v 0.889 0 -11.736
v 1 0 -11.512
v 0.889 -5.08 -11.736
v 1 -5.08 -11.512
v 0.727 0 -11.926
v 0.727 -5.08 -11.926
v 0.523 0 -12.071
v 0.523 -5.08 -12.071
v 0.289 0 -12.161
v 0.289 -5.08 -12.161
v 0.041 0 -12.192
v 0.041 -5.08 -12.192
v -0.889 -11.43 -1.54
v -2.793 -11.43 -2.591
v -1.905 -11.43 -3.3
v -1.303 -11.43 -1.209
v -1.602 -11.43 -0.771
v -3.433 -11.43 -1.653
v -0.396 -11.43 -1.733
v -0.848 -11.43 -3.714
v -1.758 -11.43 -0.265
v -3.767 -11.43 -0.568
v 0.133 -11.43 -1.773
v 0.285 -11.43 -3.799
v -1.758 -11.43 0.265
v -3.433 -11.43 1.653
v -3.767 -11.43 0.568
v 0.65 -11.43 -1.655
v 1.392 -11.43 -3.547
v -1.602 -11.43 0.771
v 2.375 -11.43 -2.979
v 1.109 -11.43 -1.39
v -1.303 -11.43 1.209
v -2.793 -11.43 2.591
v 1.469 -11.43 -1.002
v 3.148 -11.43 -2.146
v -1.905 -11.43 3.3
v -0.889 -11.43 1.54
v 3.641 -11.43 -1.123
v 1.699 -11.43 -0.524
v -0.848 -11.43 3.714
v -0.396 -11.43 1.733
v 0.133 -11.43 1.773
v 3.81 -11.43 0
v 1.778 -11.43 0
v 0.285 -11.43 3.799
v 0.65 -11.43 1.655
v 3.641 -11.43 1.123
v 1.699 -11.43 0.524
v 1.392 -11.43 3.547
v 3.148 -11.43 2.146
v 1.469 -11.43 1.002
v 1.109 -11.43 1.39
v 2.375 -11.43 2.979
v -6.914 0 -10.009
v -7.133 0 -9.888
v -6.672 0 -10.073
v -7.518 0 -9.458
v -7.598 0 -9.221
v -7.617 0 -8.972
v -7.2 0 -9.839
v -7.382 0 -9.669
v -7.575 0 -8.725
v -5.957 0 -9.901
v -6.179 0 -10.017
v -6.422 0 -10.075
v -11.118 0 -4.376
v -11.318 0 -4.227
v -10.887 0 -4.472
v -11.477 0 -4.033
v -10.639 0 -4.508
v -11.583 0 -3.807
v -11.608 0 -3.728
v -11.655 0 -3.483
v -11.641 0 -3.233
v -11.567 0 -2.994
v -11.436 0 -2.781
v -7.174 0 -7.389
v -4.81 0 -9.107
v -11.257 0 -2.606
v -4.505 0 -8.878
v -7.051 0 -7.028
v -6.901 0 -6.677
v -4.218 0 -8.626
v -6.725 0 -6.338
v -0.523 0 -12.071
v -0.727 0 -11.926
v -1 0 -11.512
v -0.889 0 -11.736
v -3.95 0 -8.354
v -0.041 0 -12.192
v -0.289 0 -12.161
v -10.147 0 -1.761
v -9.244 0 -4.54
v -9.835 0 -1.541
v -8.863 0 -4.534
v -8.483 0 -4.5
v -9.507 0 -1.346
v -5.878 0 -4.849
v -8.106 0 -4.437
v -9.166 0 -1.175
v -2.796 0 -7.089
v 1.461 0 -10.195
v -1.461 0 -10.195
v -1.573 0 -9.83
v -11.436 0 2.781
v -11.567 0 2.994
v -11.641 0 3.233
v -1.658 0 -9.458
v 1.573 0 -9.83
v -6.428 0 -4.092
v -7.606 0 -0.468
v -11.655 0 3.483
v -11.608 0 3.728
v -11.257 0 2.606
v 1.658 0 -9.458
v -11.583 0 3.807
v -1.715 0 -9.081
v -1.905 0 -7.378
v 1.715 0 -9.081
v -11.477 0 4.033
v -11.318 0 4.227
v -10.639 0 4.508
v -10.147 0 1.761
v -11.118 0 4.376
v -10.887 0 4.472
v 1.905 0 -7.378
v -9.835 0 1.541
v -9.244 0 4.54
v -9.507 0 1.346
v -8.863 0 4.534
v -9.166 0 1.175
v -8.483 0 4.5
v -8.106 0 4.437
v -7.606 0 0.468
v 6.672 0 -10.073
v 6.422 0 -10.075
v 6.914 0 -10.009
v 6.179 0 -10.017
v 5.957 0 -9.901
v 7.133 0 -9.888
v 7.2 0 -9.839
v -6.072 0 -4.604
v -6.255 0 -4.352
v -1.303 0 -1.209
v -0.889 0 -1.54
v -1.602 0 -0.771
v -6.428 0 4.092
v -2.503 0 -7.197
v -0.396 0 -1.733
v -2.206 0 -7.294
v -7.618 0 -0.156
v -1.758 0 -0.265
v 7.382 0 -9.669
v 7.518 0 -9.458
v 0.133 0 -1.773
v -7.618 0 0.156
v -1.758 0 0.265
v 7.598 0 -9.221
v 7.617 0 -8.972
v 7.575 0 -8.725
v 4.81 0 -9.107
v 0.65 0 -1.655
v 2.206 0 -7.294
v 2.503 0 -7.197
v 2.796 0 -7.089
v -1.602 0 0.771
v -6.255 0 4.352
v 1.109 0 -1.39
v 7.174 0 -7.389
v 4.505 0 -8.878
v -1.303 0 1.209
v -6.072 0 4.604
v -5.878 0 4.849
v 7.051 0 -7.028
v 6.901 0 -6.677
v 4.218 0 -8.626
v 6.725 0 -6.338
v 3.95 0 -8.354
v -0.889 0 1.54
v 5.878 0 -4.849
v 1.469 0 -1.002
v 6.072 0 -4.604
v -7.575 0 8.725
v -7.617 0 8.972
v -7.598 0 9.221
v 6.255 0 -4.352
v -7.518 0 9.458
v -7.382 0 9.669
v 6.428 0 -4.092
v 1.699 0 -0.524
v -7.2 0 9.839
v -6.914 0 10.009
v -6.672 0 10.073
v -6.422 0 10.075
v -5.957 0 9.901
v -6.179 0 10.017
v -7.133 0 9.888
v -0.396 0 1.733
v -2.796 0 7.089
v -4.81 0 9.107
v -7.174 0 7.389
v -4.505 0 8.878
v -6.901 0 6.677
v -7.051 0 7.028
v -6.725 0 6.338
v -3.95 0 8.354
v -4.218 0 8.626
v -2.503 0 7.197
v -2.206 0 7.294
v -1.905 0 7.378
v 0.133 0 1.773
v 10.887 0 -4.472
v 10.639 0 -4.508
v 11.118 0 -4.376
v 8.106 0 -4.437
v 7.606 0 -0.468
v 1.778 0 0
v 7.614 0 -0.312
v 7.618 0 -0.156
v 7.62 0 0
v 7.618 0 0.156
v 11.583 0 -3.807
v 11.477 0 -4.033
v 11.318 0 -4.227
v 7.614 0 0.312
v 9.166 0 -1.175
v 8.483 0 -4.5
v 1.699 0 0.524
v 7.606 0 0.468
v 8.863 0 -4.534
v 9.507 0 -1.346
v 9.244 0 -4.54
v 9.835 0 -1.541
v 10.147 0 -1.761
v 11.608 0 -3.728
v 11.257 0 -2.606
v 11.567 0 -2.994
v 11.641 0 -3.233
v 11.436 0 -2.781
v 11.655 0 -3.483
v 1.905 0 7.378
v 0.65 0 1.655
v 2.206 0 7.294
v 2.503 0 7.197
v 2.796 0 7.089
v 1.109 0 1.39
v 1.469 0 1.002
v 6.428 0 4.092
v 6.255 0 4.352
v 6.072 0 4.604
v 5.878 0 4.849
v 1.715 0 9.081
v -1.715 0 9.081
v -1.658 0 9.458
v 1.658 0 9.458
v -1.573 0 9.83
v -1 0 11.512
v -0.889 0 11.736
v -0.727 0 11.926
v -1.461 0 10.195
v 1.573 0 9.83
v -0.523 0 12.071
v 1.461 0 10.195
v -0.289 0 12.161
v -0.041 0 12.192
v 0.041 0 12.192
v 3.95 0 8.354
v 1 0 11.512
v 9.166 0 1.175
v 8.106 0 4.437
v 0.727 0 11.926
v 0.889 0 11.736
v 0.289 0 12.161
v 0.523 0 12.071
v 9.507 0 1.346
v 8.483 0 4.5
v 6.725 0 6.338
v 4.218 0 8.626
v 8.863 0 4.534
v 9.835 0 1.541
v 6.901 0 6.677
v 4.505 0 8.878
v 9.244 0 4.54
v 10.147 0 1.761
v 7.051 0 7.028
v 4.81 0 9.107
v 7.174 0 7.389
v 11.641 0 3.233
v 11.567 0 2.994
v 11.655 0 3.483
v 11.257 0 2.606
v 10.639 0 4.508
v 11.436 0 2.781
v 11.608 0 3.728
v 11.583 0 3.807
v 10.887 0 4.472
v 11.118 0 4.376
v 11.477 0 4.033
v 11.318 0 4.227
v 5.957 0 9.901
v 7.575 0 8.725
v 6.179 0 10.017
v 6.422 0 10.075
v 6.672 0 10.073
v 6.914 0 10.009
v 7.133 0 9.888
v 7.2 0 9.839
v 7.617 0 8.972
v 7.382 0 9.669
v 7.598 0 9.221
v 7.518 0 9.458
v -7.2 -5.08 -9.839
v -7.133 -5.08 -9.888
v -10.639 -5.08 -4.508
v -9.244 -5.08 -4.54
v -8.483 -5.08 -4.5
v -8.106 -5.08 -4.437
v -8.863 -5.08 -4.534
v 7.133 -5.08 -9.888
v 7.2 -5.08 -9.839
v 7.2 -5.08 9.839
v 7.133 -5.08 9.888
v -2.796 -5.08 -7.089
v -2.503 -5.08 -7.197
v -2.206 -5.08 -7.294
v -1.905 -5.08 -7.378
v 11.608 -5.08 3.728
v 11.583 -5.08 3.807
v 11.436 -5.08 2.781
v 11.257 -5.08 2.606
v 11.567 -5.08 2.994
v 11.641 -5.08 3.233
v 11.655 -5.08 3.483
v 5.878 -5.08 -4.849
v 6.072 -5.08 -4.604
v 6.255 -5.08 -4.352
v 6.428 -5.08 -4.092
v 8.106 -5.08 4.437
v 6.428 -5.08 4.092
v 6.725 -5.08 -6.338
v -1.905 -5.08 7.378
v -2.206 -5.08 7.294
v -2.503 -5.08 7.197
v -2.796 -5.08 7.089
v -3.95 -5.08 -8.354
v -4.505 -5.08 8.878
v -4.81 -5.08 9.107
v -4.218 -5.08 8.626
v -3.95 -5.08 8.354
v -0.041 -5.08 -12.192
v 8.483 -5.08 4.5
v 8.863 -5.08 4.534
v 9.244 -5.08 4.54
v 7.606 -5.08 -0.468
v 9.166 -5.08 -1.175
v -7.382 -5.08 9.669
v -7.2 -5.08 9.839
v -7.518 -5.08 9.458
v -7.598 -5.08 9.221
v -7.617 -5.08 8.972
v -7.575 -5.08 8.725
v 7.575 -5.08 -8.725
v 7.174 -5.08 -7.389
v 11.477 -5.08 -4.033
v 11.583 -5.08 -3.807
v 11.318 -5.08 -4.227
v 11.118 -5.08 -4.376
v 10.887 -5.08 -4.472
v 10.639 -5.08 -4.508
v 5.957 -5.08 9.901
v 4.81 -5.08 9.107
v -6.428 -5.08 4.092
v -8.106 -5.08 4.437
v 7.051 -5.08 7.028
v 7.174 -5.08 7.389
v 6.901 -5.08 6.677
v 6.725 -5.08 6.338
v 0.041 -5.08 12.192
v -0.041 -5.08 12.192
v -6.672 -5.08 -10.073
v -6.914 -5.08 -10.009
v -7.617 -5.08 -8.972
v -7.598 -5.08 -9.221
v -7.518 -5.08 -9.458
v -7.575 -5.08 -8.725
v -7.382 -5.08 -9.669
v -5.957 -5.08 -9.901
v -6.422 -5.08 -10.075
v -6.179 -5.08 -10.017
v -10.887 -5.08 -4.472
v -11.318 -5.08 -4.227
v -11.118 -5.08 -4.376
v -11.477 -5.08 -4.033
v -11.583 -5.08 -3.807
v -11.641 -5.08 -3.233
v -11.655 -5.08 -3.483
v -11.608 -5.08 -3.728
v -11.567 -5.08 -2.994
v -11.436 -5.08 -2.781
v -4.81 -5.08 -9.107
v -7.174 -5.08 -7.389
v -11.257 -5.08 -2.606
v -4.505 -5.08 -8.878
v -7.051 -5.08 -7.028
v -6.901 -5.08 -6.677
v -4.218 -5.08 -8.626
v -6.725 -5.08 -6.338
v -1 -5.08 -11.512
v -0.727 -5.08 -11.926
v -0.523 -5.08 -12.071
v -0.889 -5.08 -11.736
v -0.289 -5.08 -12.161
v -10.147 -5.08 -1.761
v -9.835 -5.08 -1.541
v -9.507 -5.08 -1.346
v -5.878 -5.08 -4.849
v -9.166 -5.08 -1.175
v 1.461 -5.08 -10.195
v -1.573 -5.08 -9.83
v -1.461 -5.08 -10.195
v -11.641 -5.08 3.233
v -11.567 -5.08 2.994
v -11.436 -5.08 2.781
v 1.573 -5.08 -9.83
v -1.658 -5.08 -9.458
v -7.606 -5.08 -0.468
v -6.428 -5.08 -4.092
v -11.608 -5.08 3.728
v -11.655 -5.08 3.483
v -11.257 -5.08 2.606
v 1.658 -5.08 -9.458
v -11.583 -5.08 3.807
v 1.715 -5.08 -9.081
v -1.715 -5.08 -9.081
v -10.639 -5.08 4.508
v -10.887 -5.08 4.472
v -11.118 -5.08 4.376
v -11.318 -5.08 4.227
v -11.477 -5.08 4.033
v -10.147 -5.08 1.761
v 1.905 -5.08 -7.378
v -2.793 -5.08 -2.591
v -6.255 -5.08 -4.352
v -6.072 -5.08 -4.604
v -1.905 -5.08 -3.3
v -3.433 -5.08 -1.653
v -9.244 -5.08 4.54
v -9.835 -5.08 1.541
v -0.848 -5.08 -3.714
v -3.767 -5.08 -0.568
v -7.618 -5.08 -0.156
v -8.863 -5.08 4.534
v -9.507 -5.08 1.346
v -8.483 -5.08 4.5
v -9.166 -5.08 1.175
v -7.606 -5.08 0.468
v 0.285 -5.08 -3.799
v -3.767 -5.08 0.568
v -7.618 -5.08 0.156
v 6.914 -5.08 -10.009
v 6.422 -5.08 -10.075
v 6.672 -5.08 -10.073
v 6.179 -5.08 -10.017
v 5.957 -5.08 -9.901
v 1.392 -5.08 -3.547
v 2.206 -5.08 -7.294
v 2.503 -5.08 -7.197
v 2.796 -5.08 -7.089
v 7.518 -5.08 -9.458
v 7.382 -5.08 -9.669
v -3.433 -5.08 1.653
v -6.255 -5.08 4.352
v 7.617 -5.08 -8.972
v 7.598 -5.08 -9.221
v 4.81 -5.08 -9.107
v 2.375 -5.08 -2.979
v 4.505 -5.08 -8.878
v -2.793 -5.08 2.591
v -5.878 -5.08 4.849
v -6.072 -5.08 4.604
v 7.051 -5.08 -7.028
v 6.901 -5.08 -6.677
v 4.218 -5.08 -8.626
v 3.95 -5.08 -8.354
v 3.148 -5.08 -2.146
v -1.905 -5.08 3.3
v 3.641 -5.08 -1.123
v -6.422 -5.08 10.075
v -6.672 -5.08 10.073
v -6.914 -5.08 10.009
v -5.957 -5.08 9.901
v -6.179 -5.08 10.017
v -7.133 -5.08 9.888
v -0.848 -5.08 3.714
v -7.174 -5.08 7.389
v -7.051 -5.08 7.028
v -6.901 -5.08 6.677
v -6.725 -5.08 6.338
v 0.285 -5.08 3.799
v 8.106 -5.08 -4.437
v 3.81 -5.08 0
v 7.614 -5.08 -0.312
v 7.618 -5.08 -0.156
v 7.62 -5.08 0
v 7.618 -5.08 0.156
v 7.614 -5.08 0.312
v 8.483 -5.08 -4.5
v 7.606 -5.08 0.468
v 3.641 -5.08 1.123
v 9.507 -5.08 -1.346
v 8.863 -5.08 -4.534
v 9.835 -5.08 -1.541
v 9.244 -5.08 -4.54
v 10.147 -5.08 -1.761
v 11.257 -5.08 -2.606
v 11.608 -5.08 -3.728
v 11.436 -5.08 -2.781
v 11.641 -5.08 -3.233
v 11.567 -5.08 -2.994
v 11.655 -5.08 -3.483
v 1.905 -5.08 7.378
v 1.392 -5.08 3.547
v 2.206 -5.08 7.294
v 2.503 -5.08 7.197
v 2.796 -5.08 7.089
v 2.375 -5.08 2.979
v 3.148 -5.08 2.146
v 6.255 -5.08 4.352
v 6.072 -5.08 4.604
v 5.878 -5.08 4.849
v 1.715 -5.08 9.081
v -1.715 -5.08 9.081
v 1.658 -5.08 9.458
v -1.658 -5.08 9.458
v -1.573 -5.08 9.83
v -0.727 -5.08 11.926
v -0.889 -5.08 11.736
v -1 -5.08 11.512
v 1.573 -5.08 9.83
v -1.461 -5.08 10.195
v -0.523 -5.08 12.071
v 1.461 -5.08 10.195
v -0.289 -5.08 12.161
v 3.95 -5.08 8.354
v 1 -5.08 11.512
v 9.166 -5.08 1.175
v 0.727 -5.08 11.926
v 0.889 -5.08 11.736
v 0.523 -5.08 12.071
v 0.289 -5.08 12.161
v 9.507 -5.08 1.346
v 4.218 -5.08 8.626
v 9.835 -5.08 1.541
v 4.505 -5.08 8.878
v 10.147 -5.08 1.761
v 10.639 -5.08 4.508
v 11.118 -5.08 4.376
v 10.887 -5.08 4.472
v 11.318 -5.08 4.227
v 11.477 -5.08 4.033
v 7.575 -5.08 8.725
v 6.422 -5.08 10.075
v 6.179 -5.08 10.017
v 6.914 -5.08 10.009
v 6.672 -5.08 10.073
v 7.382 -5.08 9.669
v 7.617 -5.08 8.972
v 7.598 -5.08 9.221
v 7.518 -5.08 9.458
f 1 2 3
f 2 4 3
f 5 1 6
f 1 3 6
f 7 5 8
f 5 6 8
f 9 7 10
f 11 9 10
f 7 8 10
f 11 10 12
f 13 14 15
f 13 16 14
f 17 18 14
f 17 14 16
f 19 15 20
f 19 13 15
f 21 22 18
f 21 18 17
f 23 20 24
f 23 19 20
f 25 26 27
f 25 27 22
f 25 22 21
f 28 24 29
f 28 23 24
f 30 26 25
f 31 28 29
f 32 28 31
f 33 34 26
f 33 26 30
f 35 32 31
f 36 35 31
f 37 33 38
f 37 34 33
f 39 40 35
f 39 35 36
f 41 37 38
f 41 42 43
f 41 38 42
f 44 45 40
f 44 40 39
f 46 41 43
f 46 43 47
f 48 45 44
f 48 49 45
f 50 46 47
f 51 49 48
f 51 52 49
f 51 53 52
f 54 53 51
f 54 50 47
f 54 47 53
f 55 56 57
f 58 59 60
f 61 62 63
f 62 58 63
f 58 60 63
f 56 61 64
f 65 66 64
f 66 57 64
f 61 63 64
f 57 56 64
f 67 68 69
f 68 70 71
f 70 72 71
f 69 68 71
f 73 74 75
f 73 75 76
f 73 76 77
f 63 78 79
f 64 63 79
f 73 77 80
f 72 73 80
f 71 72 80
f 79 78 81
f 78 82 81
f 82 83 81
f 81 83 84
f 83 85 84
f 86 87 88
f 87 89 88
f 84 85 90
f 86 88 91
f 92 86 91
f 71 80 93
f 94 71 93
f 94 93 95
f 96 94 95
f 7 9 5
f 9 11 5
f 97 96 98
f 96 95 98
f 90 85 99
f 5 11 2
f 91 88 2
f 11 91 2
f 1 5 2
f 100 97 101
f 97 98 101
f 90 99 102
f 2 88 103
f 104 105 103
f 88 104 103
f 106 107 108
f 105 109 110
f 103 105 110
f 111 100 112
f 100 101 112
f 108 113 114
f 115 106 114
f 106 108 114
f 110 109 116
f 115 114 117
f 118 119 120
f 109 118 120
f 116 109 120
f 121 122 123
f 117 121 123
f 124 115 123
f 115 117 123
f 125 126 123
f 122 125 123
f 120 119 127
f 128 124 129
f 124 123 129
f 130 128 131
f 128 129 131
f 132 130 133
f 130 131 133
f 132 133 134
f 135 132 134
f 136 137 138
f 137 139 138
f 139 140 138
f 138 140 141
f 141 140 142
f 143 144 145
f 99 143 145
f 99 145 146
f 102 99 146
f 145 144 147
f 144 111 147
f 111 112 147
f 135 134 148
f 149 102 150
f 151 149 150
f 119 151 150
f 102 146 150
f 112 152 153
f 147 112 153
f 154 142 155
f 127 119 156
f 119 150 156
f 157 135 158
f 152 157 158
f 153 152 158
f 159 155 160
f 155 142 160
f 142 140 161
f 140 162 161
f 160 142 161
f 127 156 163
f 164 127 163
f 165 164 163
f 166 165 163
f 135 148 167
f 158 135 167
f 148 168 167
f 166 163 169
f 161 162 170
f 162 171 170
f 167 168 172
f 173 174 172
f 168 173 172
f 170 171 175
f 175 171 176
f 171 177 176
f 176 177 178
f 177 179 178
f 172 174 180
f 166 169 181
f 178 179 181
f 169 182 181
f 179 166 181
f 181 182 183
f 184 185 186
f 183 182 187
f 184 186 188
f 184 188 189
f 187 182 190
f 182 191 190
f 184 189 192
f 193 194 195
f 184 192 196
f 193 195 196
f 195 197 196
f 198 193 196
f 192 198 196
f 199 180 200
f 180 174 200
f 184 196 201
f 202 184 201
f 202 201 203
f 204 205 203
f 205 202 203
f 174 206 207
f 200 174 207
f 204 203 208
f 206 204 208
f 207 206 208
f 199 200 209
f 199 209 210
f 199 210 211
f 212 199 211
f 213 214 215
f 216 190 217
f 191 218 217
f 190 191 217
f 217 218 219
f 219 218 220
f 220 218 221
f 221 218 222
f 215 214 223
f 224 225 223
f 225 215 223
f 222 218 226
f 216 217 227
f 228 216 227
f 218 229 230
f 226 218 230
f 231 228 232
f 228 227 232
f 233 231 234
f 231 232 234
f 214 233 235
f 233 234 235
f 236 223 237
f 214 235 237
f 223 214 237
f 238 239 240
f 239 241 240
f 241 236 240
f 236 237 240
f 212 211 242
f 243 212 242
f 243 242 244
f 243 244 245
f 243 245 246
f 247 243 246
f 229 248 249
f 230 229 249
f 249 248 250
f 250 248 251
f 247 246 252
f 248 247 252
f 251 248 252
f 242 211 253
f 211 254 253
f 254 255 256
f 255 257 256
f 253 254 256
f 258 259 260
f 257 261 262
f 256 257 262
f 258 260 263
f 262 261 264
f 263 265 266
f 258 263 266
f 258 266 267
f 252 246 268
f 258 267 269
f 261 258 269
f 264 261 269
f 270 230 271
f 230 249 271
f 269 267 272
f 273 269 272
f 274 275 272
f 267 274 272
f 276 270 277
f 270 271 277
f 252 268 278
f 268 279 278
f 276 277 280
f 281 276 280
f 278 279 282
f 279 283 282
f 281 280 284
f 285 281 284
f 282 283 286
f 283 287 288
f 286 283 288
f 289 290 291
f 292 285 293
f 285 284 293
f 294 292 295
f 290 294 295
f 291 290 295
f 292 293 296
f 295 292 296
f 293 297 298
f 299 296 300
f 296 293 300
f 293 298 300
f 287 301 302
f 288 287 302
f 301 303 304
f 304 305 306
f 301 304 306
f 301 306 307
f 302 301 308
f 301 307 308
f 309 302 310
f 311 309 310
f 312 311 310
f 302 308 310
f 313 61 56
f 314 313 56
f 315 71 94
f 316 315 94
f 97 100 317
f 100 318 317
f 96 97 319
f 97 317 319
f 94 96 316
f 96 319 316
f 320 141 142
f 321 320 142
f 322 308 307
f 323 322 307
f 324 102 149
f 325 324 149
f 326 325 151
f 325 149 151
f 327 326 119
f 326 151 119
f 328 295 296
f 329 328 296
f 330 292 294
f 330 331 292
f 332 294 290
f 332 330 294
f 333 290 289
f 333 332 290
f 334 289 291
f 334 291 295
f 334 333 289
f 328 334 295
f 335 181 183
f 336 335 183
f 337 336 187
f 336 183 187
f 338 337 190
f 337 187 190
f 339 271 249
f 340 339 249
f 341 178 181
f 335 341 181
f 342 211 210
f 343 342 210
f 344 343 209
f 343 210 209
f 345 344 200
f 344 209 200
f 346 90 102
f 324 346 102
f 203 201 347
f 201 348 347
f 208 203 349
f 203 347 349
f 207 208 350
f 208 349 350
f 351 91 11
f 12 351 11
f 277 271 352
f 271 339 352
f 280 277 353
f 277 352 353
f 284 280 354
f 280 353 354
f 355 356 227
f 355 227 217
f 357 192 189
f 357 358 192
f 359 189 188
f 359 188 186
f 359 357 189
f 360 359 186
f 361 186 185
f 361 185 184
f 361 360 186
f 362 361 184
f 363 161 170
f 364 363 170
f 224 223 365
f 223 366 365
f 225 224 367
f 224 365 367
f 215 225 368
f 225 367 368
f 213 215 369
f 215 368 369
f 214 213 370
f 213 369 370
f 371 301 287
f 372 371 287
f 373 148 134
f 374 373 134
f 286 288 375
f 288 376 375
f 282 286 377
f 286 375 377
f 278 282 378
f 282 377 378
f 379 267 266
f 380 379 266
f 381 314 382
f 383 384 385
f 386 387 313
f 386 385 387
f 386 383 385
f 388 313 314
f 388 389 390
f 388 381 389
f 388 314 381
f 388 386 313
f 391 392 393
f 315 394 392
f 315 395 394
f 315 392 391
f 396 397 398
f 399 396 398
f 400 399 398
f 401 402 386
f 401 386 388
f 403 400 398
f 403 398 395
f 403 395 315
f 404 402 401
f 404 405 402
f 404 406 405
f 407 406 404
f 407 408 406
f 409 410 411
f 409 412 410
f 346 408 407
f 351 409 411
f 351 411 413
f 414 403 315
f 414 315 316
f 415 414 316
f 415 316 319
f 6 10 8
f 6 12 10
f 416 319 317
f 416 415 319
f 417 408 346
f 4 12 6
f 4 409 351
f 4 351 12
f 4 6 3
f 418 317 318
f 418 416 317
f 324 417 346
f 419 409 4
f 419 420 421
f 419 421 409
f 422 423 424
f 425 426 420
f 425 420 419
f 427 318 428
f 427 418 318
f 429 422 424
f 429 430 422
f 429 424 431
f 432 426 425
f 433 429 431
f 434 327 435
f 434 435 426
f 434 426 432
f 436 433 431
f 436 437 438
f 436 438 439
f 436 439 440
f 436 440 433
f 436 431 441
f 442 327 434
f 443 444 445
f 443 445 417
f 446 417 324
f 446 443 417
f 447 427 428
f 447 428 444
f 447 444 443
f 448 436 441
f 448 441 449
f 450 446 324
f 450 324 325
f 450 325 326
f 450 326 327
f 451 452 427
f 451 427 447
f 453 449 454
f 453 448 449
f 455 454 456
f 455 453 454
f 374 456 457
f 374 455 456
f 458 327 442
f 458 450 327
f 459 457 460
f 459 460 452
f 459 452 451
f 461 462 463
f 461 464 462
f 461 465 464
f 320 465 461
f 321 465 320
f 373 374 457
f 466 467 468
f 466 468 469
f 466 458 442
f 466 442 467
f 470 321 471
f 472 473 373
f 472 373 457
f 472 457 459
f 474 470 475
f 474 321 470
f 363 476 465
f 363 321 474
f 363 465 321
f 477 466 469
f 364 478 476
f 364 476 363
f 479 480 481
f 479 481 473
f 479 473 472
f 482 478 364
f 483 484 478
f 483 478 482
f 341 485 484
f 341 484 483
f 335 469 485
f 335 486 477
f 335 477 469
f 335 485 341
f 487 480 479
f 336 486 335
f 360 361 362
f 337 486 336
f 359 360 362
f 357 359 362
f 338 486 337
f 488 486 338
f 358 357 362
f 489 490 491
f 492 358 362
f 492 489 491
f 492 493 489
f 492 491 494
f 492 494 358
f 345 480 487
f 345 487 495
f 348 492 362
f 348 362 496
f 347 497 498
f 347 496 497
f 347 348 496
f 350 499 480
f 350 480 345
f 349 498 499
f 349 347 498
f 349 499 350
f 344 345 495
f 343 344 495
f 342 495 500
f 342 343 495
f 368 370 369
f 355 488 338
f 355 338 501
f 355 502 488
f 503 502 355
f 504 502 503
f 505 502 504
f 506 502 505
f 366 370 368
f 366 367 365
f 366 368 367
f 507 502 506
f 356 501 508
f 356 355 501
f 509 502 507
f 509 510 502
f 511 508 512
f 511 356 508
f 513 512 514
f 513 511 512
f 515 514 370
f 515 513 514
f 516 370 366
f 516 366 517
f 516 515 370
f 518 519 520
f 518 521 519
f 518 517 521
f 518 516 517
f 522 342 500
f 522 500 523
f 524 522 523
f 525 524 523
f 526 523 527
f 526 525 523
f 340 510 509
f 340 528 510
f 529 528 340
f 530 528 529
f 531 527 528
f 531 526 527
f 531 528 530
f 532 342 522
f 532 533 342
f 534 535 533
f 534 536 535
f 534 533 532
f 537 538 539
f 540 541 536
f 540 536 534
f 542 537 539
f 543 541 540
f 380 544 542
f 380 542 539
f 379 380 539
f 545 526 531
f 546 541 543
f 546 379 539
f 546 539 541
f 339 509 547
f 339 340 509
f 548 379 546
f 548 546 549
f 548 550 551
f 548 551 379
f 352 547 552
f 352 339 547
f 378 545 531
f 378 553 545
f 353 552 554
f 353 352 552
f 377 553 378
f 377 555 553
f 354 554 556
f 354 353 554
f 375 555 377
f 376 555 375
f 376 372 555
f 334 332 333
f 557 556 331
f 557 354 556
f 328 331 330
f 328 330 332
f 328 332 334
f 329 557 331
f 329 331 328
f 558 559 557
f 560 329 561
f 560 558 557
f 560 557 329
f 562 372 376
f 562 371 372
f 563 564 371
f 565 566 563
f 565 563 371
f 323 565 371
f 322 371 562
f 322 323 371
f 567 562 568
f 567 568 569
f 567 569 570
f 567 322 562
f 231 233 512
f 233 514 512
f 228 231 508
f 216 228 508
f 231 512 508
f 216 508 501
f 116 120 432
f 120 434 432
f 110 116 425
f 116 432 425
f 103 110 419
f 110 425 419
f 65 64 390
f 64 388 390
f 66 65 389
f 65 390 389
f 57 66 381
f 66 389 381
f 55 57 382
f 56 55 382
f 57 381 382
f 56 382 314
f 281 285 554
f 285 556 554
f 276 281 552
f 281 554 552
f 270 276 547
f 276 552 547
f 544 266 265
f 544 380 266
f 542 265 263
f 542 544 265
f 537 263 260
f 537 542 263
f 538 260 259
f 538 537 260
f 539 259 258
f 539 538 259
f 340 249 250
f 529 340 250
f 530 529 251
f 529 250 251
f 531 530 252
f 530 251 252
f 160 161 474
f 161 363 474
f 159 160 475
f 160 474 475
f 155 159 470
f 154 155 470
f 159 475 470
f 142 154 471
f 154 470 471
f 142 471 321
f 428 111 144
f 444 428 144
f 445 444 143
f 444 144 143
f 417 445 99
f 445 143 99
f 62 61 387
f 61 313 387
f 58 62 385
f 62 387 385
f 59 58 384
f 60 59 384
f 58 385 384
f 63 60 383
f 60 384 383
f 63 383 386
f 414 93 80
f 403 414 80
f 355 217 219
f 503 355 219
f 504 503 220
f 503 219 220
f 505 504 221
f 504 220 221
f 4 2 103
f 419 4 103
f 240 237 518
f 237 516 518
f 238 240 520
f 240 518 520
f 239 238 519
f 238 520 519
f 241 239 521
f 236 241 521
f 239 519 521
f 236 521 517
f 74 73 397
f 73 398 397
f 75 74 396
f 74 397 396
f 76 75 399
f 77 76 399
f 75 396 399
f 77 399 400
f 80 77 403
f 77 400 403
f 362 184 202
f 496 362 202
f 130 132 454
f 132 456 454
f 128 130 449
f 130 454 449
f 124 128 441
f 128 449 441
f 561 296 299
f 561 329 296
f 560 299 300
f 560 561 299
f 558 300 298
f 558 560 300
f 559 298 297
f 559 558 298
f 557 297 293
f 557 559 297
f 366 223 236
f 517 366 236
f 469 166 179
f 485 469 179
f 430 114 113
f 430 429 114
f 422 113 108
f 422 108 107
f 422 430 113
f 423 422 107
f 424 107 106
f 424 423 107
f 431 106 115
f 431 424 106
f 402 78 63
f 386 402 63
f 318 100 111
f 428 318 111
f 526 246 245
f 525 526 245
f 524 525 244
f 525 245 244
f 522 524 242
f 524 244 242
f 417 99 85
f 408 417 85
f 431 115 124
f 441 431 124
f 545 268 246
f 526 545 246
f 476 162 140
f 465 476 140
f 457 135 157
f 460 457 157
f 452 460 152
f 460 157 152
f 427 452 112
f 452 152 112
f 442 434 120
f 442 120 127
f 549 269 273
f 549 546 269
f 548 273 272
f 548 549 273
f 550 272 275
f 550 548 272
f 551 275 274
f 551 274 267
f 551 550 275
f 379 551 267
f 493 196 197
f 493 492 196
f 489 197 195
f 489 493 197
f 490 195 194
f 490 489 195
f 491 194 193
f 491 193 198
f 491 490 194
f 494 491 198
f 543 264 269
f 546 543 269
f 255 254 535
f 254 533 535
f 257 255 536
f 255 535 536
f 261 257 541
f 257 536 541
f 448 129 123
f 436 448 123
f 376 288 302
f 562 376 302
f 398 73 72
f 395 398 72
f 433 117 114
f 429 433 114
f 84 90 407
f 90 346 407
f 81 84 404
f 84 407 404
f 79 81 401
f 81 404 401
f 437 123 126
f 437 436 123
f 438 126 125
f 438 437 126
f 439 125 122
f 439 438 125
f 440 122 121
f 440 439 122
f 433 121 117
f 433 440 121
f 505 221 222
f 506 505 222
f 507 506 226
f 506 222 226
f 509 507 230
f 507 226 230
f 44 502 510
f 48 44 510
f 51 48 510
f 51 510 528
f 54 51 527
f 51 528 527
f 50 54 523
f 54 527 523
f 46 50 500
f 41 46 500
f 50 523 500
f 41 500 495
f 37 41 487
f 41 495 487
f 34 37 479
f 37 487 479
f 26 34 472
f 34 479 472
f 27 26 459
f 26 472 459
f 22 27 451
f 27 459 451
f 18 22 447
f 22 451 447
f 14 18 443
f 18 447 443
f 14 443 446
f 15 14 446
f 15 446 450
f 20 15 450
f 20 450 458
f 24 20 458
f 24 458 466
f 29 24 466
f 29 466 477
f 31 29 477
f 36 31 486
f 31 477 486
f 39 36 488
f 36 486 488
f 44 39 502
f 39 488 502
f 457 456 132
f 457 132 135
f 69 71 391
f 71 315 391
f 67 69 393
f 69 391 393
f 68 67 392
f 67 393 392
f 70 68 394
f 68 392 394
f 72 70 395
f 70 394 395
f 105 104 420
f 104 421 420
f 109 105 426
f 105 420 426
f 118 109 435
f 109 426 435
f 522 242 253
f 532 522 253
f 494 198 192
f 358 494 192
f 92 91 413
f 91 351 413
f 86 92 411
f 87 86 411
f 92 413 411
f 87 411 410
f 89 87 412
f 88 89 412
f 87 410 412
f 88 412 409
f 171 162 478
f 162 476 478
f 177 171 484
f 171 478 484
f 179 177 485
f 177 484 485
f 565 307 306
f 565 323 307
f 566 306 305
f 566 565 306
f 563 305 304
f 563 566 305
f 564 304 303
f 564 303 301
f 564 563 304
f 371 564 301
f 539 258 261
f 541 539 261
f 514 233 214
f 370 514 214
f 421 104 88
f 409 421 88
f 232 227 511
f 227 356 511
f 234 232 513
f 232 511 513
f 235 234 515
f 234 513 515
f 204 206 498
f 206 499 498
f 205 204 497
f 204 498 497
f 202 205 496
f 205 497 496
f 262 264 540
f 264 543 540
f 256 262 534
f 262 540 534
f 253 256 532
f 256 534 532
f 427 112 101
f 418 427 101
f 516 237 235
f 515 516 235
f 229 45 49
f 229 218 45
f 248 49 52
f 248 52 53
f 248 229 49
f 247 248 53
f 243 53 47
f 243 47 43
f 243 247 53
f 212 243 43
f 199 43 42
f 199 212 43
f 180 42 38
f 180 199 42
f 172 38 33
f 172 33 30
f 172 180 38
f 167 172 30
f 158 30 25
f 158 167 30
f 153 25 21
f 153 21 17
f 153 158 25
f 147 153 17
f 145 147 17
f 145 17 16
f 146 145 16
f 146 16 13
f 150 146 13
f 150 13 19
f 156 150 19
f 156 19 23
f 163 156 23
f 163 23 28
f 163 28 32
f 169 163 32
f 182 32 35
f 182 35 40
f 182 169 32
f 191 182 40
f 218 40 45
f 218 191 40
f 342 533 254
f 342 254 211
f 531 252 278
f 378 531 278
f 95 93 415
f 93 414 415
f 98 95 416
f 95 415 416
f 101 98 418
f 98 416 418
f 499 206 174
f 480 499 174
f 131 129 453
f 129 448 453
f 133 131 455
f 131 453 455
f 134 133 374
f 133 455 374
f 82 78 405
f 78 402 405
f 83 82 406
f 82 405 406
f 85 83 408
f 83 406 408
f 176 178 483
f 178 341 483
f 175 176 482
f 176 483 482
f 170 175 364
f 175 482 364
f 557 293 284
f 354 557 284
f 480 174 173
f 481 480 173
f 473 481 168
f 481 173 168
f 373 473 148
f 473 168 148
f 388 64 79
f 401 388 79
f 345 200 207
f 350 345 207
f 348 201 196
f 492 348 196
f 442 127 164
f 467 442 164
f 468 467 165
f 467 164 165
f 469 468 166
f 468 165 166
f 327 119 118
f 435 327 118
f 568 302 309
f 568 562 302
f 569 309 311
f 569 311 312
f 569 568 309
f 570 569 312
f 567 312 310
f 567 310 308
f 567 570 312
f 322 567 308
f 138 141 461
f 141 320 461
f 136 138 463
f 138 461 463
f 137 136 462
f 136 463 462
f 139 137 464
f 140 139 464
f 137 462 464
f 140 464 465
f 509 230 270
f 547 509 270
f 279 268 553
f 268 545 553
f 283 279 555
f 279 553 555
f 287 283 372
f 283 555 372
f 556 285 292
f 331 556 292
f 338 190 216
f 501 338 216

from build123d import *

# Parameters (mm, degrees)
F0_R     = 1.778
F1_DEPTH = 5.08
F2_R     = 3.81
F2_R_2   = 1.778
F3_DEPTH = 6.35
F4_R     = 5.08
F5_R     = 1.016


with BuildPart() as f1:
    # F0 (on Front) → F1 (new body)
    with BuildSketch(Plane.XZ):
        with BuildLine():
            ThreePointArc((7.605604, -0.468175), (7.6164, -0.234198), (7.62, 0))
            ThreePointArc((7.62, 0), (7.6164, 0.234198), (7.605604, 0.468175))
            ThreePointArc((7.605604, 0.468175), (7.247051, 2.354709), (6.428249, 4.0917))
            ThreePointArc((6.428249, 4.0917), (6.164709, 4.478924), (5.877877, 4.849223))
            ThreePointArc((5.877877, 4.849223), (4.478924, 6.164709), (2.795522, 7.088685))
            ThreePointArc((2.795522, 7.088685), (2.354709, 7.247051), (1.905, 7.378033))
            ThreePointArc((1.905, 7.378033), (0, 7.62), (-1.905, 7.378033))
            ThreePointArc((-1.905, 7.378033), (-2.354709, 7.247051), (-2.795522, 7.088685))
            ThreePointArc((-2.795522, 7.088685), (-4.478924, 6.164709), (-5.877877, 4.849223))
            ThreePointArc((-5.877877, 4.849223), (-6.164709, 4.478924), (-6.428249, 4.0917))
            ThreePointArc((-6.428249, 4.0917), (-7.247051, 2.354709), (-7.605604, 0.468175))
            ThreePointArc((-7.605604, 0.468175), (-7.62, 0), (-7.605604, -0.468175))
            ThreePointArc((-7.605604, -0.468175), (-7.247051, -2.354709), (-6.428249, -4.0917))
            ThreePointArc((-6.428249, -4.0917), (-6.164709, -4.478924), (-5.877877, -4.849223))
            ThreePointArc((-5.877877, -4.849223), (-4.478924, -6.164709), (-2.795522, -7.088685))
            ThreePointArc((-2.795522, -7.088685), (-2.354709, -7.247051), (-1.905, -7.378033))
            ThreePointArc((-1.905, -7.378033), (0, -7.62), (1.905, -7.378033))
            ThreePointArc((1.905, -7.378033), (2.354709, -7.247051), (2.795522, -7.088685))
            ThreePointArc((2.795522, -7.088685), (4.478924, -6.164709), (5.877877, -4.849223))
            ThreePointArc((5.877877, -4.849223), (6.164709, -4.478924), (6.428249, -4.0917))
            ThreePointArc((6.428249, -4.0917), (7.247051, -2.354709), (7.605604, -0.468175))
        make_face()
        Circle(F0_R, mode=Mode.SUBTRACT)
        with BuildLine():
            ThreePointArc((6.428249, 4.0917), (7.247051, 2.354709), (7.605604, 0.468175))
            Line((7.605604, 0.468175), (9.689785, 1.412438))
            Line((9.689785, 1.412438), (11.830752, 3.04283))
            Line((11.830752, 3.04283), (11.35981, 4.49224))
            Line((11.35981, 4.49224), (8.66941, 4.552826))
            Line((8.66941, 4.552826), (6.428249, 4.0917))
        make_face()
        with BuildLine():
            Line((9.689785, -1.412438), (7.605604, -0.468175))
            ThreePointArc((7.605604, -0.468175), (7.247051, -2.354709), (6.428249, -4.0917))
            Line((6.428249, -4.0917), (8.66941, -4.552826))
            Line((8.66941, -4.552826), (11.35981, -4.49224))
            Line((11.35981, -4.49224), (11.830752, -3.04283))
            Line((11.830752, -3.04283), (9.689785, -1.412438))
        make_face()
        with BuildLine():
            ThreePointArc((2.795522, 7.088685), (4.478924, 6.164709), (5.877877, 4.849223))
            Line((5.877877, 4.849223), (7.00899, 6.838199))
            Line((7.00899, 6.838199), (7.782749, 9.415643))
            Line((7.782749, 9.415643), (6.549807, 10.311428))
            Line((6.549807, 10.311428), (4.337616, 8.779065))
            Line((4.337616, 8.779065), (2.795522, 7.088685))
        make_face()
        with BuildLine():
            Line((7.00899, -6.838199), (5.877877, -4.849223))
            ThreePointArc((5.877877, -4.849223), (4.478924, -6.164709), (2.795522, -7.088685))
            Line((2.795522, -7.088685), (4.337616, -8.779065))
            Line((4.337616, -8.779065), (6.549807, -10.311428))
            Line((6.549807, -10.311428), (7.782749, -9.415643))
            Line((7.782749, -9.415643), (7.00899, -6.838199))
        make_face()
        with BuildLine():
            ThreePointArc((-1.905, 7.378033), (0, 7.62), (1.905, 7.378033))
            Line((1.905, 7.378033), (1.651, 9.652))
            Line((1.651, 9.652), (0.762, 12.192))
            Line((0.762, 12.192), (-0.762, 12.192))
            Line((-0.762, 12.192), (-1.651, 9.652))
            Line((-1.651, 9.652), (-1.905, 7.378033))
        make_face()
        with BuildLine():
            Line((1.651, -9.652), (1.905, -7.378033))
            ThreePointArc((1.905, -7.378033), (0, -7.62), (-1.905, -7.378033))
            Line((-1.905, -7.378033), (-1.651, -9.652))
            Line((-1.651, -9.652), (-0.762, -12.192))
            Line((-0.762, -12.192), (0.762, -12.192))
            Line((0.762, -12.192), (1.651, -9.652))
        make_face()
        with BuildLine():
            ThreePointArc((-5.877877, 4.849223), (-4.478924, 6.164709), (-2.795522, 7.088685))
            Line((-2.795522, 7.088685), (-4.337616, 8.779065))
            Line((-4.337616, 8.779065), (-6.549807, 10.311428))
            Line((-6.549807, 10.311428), (-7.782749, 9.415643))
            Line((-7.782749, 9.415643), (-7.00899, 6.838199))
            Line((-7.00899, 6.838199), (-5.877877, 4.849223))
        make_face()
        with BuildLine():
            Line((-4.337616, -8.779065), (-2.795522, -7.088685))
            ThreePointArc((-2.795522, -7.088685), (-4.478924, -6.164709), (-5.877877, -4.849223))
            Line((-5.877877, -4.849223), (-7.00899, -6.838199))
            Line((-7.00899, -6.838199), (-7.782749, -9.415643))
            Line((-7.782749, -9.415643), (-6.549807, -10.311428))
            Line((-6.549807, -10.311428), (-4.337616, -8.779065))
        make_face()
        with BuildLine():
            ThreePointArc((-7.605604, 0.468175), (-7.247051, 2.354709), (-6.428249, 4.0917))
            Line((-6.428249, 4.0917), (-8.66941, 4.552826))
            Line((-8.66941, 4.552826), (-11.35981, 4.49224))
            Line((-11.35981, 4.49224), (-11.830752, 3.04283))
            Line((-11.830752, 3.04283), (-9.689785, 1.412438))
            Line((-9.689785, 1.412438), (-7.605604, 0.468175))
        make_face()
        with BuildLine():
            Line((-8.66941, -4.552826), (-6.428249, -4.0917))
            ThreePointArc((-6.428249, -4.0917), (-7.247051, -2.354709), (-7.605604, -0.468175))
            Line((-7.605604, -0.468175), (-9.689785, -1.412438))
            Line((-9.689785, -1.412438), (-11.830752, -3.04283))
            Line((-11.830752, -3.04283), (-11.35981, -4.49224))
            Line((-11.35981, -4.49224), (-8.66941, -4.552826))
        make_face()
    extrude(amount=F1_DEPTH)

    # F2 (on face) → F3 (join)
    with BuildSketch(Plane.XZ.offset(5.08)):
        Circle(F2_R)
        Circle(F2_R_2, mode=Mode.SUBTRACT)
    extrude(amount=F3_DEPTH)

    # F4
    f4_edges = [f1.edges().sort_by_distance(p)[0] for p in [
        (7.00899, -2.54, 6.838199),
        (4.337616, -2.54, 8.779065),
        (1.651, -2.54, 9.652),
        (-4.337616, -2.54, 8.779065),
        (-8.66941, -2.54, 4.552826),
        (-9.689785, -2.54, -1.412438),
        (-7.00899, -2.54, -6.838199),
        (-1.651, -2.54, -9.652),
        (4.337616, -2.54, -8.779065),
        (8.66941, -2.54, -4.552826),
        (9.689785, -2.54, 1.412438),
        (9.689785, -2.54, -1.412438),
        (8.66941, -2.54, 4.552826),
        (-1.651, -2.54, 9.652),
        (-7.00899, -2.54, 6.838199),
        (-9.689785, -2.54, 1.412438),
        (-8.66941, -2.54, -4.552826),
        (-4.337616, -2.54, -8.779065),
        (1.651, -2.54, -9.652),
        (7.00899, -2.54, -6.838199),
    ]]
    fillet(f4_edges, radius=F4_R)

    # F5
    f5_edges = [f1.edges().sort_by_distance(p)[0] for p in [
        (0.762, -2.54, 12.192),
        (-0.762, -2.54, 12.192),
        (-6.549807, -2.54, 10.311428),
        (-7.782749, -2.54, 9.415643),
        (-11.35981, -2.54, 4.49224),
        (6.549807, -2.54, 10.311428),
        (7.782749, -2.54, 9.415643),
        (11.35981, -2.54, 4.49224),
        (-11.830752, -2.54, 3.04283),
        (-11.830752, -2.54, -3.04283),
        (-11.35981, -2.54, -4.49224),
        (-7.782749, -2.54, -9.415643),
        (-6.549807, -2.54, -10.311428),
        (-0.762, -2.54, -12.192),
        (0.762, -2.54, -12.192),
        (6.549807, -2.54, -10.311428),
        (7.782749, -2.54, -9.415643),
        (11.830752, -2.54, -3.04283),
        (11.35981, -2.54, -4.49224),
        (11.830752, -2.54, 3.04283),
    ]]
    fillet(f5_edges, radius=F5_R)


solid = f1.part
